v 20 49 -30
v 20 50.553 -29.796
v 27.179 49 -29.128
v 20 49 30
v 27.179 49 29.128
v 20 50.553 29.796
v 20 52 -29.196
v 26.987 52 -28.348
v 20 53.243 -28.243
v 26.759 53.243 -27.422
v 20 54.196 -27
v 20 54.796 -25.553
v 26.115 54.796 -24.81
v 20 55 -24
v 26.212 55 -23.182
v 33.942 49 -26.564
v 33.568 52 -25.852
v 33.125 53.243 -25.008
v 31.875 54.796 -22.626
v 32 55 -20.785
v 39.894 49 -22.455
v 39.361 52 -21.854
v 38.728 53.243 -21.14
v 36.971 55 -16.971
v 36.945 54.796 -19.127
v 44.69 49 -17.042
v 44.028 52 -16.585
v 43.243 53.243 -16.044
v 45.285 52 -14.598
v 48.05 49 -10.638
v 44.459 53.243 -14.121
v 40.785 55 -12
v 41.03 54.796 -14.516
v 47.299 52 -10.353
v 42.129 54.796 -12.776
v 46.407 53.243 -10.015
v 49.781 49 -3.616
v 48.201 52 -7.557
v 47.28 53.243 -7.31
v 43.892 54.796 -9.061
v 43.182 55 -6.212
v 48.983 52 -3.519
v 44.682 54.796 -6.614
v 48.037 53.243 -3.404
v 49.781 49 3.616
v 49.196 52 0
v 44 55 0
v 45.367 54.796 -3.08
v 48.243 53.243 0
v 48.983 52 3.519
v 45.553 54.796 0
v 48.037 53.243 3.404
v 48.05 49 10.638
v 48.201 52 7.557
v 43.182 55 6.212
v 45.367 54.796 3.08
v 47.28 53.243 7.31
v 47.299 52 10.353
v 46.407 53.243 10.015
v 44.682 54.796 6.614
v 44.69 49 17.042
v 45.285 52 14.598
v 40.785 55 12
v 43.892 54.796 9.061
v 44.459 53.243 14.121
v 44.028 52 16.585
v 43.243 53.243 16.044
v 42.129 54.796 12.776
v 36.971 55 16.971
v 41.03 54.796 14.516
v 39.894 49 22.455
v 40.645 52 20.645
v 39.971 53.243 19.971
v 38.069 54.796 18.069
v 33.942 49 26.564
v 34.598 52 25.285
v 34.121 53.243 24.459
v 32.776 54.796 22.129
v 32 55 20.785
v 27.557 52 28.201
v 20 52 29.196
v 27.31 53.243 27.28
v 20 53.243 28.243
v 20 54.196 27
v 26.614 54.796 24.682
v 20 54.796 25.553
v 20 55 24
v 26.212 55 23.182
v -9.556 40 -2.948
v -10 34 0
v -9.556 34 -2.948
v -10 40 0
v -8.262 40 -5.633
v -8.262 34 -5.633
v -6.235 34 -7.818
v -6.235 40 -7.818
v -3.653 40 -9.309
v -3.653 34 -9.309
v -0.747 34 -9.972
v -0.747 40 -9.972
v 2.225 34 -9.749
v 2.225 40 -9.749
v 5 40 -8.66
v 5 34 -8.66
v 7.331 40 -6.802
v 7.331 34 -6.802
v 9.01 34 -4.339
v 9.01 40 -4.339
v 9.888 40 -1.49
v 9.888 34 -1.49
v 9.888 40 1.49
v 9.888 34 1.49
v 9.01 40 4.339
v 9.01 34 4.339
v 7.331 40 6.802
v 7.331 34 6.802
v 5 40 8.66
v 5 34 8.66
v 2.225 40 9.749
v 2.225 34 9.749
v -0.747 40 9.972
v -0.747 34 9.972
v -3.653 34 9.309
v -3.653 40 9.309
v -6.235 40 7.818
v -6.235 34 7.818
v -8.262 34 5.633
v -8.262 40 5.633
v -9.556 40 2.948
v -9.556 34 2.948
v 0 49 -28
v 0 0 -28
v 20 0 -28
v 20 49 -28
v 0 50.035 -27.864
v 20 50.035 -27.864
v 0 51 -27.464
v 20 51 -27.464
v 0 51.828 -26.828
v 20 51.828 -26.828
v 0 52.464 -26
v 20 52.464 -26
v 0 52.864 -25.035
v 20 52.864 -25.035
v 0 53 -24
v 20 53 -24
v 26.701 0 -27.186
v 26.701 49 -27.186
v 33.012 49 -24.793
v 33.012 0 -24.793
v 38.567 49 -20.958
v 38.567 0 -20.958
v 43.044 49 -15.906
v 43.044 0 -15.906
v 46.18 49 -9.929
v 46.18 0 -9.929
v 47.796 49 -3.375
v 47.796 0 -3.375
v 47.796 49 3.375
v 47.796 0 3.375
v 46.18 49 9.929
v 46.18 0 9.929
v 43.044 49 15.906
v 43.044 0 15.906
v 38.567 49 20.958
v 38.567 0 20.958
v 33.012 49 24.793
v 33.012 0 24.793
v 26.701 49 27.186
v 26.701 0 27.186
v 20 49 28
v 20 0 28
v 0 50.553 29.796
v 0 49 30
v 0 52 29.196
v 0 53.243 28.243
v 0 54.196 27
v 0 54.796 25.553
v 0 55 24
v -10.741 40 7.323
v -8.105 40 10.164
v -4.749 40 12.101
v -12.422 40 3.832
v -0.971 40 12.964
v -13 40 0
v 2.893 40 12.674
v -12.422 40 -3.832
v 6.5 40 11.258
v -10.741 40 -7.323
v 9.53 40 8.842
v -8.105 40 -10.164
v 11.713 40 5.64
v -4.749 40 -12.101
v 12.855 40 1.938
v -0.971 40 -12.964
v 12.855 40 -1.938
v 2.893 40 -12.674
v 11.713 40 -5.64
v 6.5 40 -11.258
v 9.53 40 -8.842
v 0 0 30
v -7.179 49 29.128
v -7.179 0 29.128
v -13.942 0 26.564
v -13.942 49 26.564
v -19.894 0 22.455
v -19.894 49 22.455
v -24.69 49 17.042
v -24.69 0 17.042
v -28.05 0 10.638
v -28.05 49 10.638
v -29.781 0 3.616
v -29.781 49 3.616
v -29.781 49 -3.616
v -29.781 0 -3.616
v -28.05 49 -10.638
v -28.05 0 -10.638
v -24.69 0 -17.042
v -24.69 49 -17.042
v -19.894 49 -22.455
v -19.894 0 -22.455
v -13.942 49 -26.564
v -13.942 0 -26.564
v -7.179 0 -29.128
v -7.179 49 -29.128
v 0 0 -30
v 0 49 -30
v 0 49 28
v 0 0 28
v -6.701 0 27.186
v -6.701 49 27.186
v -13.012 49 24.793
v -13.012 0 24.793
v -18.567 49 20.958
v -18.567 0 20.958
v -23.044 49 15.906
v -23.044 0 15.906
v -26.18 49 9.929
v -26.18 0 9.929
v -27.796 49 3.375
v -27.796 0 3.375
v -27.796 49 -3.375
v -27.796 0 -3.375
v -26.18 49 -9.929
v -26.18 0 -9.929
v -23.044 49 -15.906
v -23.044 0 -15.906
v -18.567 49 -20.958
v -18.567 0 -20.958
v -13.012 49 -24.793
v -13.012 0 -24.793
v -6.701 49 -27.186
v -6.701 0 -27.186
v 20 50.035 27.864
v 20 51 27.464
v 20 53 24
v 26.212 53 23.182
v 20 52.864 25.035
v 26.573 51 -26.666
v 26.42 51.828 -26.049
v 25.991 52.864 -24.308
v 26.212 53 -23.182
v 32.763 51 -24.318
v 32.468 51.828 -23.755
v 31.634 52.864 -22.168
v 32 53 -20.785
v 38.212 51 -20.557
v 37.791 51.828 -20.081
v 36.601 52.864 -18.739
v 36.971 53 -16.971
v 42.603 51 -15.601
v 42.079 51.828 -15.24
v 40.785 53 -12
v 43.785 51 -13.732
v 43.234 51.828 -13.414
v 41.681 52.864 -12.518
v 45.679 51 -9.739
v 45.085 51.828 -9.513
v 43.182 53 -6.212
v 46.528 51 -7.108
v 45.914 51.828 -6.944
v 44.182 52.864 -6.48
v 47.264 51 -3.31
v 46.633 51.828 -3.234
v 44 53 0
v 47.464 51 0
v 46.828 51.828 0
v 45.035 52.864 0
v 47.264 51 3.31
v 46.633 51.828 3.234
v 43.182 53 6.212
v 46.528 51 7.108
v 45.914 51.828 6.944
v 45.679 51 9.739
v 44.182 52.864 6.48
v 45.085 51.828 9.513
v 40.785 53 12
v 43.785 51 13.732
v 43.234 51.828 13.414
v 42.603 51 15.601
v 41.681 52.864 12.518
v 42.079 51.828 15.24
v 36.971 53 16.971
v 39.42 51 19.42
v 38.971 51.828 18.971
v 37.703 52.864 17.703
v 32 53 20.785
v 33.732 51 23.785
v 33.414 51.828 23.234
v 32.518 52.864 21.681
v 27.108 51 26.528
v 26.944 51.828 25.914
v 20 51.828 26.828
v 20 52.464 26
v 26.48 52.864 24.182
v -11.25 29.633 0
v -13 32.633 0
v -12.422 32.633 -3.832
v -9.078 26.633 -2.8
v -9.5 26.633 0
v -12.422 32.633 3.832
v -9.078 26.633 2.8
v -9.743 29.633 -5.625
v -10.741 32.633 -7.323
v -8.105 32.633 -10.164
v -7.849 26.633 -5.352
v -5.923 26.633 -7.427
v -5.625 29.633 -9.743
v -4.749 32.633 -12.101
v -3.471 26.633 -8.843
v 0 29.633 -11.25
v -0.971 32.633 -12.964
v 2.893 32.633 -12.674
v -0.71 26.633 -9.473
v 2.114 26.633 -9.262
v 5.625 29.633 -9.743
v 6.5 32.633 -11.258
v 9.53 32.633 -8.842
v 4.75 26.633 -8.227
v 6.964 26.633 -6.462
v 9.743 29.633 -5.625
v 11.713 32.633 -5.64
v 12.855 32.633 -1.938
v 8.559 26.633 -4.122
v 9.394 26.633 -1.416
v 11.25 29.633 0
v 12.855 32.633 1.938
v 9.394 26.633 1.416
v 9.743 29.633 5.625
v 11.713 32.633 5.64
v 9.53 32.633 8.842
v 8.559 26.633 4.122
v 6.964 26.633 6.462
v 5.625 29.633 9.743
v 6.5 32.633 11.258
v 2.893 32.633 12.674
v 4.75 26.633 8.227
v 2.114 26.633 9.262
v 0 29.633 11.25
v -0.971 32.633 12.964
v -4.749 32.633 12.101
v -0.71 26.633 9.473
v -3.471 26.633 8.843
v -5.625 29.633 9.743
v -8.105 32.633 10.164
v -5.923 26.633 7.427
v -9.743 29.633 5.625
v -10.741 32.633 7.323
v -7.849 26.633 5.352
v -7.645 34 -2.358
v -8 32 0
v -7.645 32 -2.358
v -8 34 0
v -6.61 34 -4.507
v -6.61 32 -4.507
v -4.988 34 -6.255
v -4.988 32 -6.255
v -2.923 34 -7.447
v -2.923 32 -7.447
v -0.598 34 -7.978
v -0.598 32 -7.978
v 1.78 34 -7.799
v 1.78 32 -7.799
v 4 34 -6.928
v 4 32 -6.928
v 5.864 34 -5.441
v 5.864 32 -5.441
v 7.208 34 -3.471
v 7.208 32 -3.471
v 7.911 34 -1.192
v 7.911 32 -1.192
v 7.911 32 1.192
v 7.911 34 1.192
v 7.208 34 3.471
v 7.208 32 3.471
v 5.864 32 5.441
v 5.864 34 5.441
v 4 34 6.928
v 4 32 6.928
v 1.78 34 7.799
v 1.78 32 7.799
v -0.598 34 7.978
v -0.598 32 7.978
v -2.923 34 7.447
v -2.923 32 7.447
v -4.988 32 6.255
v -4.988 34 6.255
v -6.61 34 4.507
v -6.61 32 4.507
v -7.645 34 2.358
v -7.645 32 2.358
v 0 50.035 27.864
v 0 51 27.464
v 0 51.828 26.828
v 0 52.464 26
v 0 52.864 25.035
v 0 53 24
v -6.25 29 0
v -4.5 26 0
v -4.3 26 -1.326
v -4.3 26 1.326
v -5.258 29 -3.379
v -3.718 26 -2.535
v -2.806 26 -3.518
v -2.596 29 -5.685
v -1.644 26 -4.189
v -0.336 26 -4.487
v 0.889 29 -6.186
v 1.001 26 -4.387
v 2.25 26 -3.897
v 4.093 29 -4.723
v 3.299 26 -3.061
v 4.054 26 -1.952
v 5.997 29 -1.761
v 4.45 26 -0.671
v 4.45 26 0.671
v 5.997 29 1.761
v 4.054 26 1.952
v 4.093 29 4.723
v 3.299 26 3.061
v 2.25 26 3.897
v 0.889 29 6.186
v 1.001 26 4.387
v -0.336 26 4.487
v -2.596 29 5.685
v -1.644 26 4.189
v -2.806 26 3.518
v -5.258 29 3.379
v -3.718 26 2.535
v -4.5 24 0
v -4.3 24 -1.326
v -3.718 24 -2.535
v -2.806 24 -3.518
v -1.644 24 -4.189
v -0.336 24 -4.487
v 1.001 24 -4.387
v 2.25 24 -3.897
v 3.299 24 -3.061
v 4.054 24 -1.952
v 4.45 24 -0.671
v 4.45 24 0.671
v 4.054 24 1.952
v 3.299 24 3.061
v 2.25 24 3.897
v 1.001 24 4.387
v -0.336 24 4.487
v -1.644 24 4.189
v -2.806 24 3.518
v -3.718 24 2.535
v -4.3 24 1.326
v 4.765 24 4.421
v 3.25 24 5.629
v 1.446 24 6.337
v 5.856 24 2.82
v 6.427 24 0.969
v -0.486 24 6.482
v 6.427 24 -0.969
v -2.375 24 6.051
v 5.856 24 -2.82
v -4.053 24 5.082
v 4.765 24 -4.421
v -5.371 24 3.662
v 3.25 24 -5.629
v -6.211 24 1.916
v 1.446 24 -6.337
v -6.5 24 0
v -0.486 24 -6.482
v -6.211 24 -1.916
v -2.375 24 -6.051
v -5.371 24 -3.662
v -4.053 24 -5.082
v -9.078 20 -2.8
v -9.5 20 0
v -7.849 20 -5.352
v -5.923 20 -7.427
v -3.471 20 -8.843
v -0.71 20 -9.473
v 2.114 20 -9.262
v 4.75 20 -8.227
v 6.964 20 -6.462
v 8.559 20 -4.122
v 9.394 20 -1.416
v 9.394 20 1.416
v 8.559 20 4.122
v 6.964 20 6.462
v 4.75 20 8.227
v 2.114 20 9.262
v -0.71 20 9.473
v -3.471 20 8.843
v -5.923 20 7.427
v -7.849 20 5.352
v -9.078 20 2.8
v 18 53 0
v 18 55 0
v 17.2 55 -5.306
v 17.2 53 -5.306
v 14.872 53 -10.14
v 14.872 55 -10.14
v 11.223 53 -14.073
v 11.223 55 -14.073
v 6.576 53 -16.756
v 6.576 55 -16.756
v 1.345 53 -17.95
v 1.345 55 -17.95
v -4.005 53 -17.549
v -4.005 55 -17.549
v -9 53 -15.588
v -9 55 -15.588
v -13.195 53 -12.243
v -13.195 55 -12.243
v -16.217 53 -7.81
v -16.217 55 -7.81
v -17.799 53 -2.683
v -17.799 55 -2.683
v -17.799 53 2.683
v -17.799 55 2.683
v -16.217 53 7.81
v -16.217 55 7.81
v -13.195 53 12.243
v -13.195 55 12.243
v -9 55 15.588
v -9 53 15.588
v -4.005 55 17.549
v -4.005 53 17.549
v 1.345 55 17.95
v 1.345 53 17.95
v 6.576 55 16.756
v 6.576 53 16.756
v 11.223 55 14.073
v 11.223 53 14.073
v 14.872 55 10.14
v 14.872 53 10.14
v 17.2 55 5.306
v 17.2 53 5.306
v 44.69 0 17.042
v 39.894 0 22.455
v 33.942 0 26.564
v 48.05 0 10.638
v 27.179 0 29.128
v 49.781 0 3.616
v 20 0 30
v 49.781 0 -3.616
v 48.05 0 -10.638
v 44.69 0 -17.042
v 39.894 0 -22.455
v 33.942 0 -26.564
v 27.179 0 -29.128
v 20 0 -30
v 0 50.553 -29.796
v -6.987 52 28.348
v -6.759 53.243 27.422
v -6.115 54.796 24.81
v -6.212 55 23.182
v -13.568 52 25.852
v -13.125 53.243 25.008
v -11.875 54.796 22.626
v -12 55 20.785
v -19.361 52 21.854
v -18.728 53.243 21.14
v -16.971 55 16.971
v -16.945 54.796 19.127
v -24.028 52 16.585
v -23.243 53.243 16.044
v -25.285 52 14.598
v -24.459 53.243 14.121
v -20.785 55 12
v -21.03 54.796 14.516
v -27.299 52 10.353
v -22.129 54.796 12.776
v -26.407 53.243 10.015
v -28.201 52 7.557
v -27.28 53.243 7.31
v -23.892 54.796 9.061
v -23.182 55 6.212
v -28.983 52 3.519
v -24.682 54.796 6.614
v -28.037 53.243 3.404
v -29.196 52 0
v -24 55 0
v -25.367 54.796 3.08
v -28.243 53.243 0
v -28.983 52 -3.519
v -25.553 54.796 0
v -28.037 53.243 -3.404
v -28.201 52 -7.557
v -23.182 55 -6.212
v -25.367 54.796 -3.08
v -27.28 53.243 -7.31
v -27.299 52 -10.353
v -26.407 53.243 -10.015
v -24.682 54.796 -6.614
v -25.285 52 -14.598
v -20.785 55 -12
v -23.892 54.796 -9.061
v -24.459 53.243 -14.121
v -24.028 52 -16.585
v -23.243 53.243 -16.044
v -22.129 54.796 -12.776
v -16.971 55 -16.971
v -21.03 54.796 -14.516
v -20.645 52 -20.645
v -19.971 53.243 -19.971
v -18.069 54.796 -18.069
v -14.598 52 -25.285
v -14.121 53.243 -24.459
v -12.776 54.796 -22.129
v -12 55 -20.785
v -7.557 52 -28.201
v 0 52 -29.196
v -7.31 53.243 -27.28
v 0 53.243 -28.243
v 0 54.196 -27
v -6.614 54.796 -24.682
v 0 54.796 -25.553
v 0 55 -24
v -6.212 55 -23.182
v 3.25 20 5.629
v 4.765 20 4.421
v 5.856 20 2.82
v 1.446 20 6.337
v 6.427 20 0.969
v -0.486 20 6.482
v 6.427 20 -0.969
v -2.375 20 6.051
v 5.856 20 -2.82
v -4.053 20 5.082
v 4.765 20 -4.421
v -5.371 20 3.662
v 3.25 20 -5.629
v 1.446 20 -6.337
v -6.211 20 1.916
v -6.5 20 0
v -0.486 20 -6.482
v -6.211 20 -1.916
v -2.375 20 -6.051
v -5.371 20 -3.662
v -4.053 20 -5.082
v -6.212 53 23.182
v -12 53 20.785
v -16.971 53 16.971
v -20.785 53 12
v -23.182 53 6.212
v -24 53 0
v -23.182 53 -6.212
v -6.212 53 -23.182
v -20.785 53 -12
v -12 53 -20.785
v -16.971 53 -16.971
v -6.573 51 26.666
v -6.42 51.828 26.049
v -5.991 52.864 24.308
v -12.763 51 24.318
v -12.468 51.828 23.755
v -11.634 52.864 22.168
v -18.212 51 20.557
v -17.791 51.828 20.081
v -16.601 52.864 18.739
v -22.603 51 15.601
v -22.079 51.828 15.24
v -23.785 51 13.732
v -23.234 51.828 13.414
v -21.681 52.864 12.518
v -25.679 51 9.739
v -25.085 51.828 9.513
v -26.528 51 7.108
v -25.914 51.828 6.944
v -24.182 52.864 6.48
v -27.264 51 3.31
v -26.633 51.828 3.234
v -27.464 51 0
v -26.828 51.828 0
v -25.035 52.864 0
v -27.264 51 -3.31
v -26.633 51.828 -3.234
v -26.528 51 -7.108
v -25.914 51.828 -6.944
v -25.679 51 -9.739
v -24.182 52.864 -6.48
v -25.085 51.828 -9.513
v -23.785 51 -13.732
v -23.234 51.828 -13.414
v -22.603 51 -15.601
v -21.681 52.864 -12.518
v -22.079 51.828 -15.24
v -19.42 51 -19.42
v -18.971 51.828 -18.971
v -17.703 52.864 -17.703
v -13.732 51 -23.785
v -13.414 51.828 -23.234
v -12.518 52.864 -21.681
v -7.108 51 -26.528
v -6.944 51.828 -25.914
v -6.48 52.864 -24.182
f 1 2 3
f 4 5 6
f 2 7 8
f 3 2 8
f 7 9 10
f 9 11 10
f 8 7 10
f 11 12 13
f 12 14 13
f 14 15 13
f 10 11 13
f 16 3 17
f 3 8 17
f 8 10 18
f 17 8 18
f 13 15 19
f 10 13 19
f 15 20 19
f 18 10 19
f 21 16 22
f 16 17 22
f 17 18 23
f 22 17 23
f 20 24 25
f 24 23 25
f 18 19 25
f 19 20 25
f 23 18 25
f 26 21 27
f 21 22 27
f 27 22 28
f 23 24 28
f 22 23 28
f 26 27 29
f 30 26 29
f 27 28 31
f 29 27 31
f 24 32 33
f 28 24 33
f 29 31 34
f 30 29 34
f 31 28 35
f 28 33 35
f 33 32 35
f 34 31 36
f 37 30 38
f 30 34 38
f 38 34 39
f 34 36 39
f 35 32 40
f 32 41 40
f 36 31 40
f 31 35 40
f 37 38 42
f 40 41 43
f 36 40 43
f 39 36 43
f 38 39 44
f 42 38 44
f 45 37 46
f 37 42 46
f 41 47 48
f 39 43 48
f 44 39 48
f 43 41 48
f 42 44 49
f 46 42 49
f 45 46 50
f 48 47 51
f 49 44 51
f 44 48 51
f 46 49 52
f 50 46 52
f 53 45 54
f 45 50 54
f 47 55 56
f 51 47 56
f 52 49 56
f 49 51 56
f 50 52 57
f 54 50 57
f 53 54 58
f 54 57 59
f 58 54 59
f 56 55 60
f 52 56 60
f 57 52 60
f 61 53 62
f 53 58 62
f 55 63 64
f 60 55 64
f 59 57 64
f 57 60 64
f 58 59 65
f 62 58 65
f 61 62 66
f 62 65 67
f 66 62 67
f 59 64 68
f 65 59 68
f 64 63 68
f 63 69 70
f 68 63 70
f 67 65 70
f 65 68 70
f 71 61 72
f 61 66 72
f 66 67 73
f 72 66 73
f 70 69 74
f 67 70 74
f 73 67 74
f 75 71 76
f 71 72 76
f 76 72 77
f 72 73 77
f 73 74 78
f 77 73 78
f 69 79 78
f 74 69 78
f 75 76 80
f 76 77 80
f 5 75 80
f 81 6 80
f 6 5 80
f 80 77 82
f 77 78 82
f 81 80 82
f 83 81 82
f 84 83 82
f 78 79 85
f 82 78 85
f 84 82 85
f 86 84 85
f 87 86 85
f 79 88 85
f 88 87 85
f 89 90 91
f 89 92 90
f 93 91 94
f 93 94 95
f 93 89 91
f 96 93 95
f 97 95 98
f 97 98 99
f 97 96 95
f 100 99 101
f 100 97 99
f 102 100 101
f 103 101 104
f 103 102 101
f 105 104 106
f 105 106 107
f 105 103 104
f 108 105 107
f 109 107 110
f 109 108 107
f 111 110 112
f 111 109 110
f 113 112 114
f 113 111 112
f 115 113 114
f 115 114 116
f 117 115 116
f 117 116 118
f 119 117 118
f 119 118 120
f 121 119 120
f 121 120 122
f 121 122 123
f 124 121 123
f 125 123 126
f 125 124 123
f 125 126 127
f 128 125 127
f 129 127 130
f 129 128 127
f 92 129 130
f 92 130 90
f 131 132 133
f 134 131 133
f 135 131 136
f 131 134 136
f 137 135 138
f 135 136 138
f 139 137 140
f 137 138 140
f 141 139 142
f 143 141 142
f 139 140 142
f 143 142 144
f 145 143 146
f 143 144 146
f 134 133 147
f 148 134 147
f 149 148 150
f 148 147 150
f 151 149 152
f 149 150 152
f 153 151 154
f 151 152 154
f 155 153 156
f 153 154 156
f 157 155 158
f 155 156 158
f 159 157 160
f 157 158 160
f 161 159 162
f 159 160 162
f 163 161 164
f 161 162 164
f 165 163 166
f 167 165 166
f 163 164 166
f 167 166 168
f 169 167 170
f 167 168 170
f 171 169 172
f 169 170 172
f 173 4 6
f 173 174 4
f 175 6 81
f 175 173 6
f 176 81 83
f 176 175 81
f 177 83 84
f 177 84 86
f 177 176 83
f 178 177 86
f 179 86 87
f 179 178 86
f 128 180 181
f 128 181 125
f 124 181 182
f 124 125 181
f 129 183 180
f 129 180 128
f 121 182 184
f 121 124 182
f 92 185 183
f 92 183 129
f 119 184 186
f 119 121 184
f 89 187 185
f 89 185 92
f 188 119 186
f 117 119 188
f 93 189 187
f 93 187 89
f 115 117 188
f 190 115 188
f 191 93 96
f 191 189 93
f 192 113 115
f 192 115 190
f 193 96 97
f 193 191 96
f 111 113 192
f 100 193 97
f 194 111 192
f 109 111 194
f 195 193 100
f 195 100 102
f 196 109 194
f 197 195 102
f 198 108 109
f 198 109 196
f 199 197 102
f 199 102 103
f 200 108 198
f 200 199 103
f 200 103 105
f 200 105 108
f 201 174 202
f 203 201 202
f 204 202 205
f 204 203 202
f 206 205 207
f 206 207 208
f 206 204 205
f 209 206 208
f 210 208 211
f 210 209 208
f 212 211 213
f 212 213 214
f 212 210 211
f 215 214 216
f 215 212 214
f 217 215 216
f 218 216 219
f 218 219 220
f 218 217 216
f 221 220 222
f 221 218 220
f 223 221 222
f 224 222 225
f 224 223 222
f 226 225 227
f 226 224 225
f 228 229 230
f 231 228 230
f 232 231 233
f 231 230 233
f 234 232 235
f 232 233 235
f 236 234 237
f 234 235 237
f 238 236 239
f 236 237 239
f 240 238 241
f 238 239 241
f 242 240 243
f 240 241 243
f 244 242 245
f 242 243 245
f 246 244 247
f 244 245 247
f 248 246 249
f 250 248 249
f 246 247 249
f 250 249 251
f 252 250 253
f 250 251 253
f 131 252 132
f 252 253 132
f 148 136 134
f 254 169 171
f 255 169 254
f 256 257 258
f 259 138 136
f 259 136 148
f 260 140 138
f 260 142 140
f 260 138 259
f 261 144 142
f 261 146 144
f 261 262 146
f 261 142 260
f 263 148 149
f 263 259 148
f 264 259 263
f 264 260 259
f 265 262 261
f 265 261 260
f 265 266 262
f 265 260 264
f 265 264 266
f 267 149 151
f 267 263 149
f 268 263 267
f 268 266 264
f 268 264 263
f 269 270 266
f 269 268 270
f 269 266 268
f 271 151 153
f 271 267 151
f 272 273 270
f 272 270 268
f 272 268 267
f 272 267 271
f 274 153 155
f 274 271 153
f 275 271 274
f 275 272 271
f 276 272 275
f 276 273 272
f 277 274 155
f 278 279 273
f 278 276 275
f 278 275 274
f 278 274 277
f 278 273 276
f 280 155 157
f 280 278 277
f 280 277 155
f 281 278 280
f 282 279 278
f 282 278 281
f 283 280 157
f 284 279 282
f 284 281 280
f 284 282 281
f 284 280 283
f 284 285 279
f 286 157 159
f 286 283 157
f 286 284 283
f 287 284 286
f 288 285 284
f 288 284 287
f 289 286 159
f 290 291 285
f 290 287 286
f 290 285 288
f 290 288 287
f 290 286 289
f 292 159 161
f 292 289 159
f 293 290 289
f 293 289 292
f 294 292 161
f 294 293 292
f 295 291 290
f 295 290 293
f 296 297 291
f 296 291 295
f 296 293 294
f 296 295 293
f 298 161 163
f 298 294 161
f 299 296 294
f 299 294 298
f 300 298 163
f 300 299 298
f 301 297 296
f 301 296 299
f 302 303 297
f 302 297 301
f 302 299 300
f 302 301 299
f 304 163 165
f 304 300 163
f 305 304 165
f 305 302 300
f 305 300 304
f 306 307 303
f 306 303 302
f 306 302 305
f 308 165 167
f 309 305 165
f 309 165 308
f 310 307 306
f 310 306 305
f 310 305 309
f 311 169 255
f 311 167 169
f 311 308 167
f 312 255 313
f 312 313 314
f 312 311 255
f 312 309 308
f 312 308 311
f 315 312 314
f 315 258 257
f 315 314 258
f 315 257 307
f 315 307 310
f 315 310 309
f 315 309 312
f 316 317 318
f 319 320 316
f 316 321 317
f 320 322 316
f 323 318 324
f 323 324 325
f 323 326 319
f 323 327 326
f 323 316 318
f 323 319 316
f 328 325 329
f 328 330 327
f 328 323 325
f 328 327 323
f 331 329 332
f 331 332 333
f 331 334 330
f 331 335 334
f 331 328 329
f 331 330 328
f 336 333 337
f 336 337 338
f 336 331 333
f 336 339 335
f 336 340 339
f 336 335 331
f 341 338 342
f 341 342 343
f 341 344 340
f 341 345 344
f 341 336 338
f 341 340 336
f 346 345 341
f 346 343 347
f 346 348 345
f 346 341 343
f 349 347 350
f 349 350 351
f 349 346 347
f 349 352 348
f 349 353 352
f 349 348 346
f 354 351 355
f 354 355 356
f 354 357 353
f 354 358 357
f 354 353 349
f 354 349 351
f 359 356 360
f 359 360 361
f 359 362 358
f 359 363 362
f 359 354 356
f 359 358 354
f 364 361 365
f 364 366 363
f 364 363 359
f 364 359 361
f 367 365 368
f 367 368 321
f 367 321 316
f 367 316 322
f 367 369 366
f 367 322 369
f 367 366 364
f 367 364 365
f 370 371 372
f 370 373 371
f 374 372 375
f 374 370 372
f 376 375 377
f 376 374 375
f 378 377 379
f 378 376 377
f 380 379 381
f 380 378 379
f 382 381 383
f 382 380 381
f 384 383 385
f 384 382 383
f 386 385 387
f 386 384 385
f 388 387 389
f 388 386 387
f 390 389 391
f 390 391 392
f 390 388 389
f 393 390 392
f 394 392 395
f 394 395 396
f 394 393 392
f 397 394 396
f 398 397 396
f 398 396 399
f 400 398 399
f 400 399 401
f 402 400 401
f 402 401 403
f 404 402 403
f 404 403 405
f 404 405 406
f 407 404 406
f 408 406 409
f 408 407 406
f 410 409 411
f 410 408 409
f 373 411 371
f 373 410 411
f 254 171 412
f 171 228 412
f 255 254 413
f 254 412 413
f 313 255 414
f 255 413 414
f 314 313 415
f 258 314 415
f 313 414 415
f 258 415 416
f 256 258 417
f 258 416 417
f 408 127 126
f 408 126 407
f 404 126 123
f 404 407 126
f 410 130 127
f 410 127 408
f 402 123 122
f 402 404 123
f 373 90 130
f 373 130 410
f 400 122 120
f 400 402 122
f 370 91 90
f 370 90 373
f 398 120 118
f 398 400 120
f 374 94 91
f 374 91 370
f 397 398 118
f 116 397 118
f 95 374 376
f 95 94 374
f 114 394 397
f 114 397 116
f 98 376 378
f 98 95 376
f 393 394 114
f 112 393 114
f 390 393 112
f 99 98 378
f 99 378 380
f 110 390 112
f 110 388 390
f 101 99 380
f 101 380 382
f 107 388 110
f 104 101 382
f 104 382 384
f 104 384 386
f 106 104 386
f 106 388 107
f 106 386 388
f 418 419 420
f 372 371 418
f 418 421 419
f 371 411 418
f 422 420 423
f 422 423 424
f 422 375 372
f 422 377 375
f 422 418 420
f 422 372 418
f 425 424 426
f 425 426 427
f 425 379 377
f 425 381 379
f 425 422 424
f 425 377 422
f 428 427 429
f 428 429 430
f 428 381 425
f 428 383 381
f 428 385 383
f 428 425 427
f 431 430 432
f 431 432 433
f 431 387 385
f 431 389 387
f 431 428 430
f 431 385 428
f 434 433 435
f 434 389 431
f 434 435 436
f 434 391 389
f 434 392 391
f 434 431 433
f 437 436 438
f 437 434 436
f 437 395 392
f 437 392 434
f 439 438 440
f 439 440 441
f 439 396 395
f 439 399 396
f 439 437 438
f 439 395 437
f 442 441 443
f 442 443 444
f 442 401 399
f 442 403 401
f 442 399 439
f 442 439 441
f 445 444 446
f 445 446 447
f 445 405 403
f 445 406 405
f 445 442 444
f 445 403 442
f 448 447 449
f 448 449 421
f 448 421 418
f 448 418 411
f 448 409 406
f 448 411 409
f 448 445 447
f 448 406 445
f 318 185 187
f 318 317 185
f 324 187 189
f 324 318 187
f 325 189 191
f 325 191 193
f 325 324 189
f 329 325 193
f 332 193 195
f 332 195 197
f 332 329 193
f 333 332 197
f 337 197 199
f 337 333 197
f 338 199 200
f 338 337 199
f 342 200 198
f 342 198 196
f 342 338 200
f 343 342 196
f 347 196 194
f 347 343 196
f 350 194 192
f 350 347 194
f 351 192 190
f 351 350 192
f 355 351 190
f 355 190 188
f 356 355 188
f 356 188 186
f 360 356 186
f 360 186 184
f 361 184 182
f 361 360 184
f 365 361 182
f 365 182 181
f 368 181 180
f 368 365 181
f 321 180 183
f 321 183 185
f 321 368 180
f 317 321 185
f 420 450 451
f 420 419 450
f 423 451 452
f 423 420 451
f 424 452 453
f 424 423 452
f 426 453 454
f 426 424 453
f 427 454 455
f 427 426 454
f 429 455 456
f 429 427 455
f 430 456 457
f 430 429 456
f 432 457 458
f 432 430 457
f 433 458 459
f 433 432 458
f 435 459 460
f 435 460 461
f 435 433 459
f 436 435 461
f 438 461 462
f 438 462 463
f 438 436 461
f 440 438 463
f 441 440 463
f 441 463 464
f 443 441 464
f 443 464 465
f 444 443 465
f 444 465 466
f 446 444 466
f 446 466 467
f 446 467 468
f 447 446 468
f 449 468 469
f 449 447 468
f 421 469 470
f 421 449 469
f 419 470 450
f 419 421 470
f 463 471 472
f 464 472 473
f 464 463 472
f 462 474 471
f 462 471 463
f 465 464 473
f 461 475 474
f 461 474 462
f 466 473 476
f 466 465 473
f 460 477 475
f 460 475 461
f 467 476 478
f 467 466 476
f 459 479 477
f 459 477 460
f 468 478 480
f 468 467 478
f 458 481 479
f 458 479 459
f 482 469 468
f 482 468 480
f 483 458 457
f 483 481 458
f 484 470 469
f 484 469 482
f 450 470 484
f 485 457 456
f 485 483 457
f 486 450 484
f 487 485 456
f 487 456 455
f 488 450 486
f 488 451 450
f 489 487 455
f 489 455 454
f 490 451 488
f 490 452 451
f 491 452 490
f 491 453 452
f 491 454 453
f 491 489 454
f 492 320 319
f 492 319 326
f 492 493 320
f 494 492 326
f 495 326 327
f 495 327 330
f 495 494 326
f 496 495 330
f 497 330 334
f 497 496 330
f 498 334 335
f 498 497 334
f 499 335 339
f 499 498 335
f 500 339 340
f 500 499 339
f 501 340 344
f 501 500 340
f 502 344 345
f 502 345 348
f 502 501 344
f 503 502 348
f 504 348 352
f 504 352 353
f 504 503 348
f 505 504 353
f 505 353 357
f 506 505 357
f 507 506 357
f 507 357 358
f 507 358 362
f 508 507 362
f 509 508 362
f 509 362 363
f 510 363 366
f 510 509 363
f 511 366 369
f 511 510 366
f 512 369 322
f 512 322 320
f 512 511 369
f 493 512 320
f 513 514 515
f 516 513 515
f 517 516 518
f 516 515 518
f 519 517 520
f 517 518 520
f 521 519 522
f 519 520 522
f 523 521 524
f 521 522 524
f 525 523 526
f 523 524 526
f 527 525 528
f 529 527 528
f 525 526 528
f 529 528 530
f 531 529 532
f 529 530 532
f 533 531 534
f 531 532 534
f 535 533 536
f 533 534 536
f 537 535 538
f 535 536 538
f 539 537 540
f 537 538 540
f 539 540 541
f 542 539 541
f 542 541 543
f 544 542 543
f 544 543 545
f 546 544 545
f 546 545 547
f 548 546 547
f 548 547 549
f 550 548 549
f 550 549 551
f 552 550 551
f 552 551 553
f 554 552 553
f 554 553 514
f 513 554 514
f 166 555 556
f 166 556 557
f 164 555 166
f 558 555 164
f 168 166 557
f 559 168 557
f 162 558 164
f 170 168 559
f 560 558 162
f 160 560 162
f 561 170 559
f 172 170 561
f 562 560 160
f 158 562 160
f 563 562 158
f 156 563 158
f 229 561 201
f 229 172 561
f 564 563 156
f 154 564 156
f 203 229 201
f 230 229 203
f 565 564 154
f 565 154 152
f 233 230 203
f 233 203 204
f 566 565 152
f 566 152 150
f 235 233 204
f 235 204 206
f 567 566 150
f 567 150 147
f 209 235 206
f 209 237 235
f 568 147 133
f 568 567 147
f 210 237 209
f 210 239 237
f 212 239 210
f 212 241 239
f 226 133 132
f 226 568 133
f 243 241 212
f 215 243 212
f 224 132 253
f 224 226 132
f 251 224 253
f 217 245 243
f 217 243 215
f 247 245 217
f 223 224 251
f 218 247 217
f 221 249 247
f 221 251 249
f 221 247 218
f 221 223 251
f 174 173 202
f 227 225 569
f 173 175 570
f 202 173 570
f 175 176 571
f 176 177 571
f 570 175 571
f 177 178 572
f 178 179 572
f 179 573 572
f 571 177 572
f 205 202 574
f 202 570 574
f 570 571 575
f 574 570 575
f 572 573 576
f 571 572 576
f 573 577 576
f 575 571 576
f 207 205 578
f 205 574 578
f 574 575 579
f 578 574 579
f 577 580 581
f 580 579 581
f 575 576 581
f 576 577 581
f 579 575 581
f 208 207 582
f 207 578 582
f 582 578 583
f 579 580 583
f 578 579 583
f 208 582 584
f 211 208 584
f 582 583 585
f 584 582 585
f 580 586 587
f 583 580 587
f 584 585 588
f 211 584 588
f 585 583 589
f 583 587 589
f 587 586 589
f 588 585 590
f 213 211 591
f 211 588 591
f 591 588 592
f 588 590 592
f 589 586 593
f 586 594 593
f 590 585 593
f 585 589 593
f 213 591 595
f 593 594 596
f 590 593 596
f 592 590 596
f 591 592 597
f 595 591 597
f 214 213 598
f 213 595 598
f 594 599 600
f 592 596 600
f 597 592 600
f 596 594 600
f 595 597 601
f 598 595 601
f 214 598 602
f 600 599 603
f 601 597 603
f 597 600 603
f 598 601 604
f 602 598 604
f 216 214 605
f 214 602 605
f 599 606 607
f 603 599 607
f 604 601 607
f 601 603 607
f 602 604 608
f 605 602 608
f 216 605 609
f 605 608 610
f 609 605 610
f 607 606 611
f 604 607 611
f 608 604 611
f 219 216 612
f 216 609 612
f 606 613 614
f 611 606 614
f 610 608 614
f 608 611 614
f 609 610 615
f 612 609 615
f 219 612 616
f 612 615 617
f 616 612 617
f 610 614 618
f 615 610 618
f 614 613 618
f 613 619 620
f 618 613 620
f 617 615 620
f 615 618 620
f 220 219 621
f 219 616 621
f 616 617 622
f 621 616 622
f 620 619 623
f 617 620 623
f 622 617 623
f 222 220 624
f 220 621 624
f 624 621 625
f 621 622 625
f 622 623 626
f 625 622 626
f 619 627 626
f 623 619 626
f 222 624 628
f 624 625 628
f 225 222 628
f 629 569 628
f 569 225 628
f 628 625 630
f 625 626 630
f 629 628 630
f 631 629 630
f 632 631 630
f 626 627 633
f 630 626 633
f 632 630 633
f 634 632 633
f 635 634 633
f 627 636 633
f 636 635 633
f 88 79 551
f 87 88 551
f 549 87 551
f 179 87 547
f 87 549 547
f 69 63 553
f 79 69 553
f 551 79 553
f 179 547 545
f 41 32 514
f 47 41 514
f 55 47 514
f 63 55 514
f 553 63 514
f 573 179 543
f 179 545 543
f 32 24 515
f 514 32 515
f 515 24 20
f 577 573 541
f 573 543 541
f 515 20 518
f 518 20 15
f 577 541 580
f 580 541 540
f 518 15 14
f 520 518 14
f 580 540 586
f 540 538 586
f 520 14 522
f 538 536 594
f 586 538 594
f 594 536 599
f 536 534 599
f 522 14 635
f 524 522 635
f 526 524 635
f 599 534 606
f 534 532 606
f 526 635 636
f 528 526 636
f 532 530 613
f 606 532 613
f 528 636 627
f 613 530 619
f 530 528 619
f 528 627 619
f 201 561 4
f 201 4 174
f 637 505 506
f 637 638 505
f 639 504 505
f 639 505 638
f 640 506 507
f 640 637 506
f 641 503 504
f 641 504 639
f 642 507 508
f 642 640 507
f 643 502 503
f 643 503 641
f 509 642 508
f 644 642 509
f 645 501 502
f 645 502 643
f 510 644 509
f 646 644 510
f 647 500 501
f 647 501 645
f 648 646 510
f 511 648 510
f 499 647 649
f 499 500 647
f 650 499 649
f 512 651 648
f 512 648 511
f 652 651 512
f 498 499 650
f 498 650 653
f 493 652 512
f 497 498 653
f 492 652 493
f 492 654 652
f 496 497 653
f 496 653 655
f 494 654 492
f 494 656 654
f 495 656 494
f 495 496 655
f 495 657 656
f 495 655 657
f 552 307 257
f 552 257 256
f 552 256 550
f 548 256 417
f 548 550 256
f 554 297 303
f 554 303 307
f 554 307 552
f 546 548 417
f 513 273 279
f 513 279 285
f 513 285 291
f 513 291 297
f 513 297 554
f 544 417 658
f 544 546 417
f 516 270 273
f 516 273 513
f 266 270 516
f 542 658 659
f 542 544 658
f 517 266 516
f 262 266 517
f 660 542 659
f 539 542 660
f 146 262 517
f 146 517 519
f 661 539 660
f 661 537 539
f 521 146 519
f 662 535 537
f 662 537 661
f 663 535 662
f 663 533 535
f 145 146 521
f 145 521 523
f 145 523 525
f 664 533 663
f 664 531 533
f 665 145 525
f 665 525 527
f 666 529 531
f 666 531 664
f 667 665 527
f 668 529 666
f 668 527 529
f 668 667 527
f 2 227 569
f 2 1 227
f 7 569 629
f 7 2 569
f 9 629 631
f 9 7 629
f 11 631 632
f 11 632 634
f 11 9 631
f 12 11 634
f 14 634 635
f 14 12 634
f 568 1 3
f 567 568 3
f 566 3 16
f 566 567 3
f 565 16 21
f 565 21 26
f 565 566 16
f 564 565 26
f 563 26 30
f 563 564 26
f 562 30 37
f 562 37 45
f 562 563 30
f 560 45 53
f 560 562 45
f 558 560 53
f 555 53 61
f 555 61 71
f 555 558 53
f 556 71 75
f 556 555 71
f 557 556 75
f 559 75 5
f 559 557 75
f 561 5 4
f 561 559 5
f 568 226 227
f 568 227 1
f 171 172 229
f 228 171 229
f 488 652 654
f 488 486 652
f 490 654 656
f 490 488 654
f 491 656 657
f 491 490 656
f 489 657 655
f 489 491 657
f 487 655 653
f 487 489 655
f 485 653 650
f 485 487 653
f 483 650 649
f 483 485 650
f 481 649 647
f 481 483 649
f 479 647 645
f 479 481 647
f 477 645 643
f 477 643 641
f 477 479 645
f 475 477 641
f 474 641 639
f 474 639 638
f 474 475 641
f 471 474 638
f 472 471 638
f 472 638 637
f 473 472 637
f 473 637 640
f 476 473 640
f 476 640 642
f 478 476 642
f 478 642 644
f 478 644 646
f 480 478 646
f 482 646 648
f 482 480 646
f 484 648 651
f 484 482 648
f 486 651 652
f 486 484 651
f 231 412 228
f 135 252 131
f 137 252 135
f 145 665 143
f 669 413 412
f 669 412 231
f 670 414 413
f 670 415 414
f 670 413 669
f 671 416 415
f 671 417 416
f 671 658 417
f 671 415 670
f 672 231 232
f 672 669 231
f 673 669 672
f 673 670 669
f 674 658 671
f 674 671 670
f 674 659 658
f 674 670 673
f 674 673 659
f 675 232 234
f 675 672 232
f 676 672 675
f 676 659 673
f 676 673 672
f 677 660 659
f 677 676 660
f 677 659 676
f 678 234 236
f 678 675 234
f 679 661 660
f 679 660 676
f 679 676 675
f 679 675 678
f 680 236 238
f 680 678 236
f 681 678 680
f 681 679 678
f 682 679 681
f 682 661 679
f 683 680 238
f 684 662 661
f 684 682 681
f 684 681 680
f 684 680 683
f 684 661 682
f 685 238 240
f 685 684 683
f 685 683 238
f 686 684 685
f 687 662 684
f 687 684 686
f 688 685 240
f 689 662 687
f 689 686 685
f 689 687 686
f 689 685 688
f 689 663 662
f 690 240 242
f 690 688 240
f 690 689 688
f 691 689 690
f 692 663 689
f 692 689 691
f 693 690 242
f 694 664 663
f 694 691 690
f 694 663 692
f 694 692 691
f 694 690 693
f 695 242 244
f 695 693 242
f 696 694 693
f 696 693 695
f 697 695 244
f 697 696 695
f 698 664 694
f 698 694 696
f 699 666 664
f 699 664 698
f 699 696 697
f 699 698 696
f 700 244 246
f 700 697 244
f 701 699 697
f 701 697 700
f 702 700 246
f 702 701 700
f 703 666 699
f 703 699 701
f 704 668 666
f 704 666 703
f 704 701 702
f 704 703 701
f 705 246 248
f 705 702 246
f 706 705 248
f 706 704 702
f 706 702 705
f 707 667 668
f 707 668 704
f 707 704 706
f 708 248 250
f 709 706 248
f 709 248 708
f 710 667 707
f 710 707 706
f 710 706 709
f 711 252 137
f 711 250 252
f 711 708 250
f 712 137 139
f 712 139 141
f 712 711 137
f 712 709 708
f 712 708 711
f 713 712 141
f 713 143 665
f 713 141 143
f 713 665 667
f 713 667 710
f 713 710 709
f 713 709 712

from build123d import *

# Parameters (mm, degrees)
EXTRUDE_1_DEPTH     = 55
FILLET_1_R          = 6
SHELL_1_T           = -2
SKETCH_2_R          = 18
CUT_EXTRUDE_1_DEPTH = 56


with BuildPart() as part:
    # 草图1 → 凸台-拉伸1 (new body)
    with BuildSketch(Plane(origin=(0, 0, 0), x_dir=(1, 0, 0), z_dir=(0, 1, 0))):
        with BuildLine():
            Line((0, 30), (20, 30))
            ThreePointArc((20, 30), (50, 0), (20, -30))
            Line((20, -30), (0, -30))
            ThreePointArc((0, -30), (-30, 0), (0, 30))
        make_face()
    extrude(amount=EXTRUDE_1_DEPTH)

    # 圆角1
    fillet_1_edges = [part.edges().sort_by_distance(p)[0] for p in [
        (50, 55, 0),
        (10, 55, -30),
        (-30, 55, 0),
        (10, 55, 30),
    ]]
    fillet(fillet_1_edges, radius=FILLET_1_R)

    # 抽壳1
    shell_1_openings = [part.faces().sort_by_distance(p)[0] for p in [
        (10, 0, 0),
    ]]
    offset(amount=SHELL_1_T, openings=shell_1_openings, kind=Kind.INTERSECTION)

    # 草图2 → 切除-拉伸1 (cut, through all)
    with BuildSketch(Plane(origin=(0, 55, 0), x_dir=(1, 0, 0), z_dir=(0, 1, 0))):
        Circle(SKETCH_2_R)
    extrude(amount=-CUT_EXTRUDE_1_DEPTH, mode=Mode.SUBTRACT)


with BuildPart() as body_2:
    # 草图3 → 旋转1 (revolve)
    with BuildSketch(Plane.XY):
        Polygon((-10, 40), (-13, 40), (-13, 32.632889149), (-9.5, 26.632889149), (-9.5, 20), (-6.5, 20), (-6.5, 24), (-4.5, 24), (-4.5, 26), (-8, 32), (-8, 34), (-10, 34), align=None)
    revolve(axis=Axis((0, 40, 0), (0, -1, 0)))


solid = Compound([part.part, body_2.part])
